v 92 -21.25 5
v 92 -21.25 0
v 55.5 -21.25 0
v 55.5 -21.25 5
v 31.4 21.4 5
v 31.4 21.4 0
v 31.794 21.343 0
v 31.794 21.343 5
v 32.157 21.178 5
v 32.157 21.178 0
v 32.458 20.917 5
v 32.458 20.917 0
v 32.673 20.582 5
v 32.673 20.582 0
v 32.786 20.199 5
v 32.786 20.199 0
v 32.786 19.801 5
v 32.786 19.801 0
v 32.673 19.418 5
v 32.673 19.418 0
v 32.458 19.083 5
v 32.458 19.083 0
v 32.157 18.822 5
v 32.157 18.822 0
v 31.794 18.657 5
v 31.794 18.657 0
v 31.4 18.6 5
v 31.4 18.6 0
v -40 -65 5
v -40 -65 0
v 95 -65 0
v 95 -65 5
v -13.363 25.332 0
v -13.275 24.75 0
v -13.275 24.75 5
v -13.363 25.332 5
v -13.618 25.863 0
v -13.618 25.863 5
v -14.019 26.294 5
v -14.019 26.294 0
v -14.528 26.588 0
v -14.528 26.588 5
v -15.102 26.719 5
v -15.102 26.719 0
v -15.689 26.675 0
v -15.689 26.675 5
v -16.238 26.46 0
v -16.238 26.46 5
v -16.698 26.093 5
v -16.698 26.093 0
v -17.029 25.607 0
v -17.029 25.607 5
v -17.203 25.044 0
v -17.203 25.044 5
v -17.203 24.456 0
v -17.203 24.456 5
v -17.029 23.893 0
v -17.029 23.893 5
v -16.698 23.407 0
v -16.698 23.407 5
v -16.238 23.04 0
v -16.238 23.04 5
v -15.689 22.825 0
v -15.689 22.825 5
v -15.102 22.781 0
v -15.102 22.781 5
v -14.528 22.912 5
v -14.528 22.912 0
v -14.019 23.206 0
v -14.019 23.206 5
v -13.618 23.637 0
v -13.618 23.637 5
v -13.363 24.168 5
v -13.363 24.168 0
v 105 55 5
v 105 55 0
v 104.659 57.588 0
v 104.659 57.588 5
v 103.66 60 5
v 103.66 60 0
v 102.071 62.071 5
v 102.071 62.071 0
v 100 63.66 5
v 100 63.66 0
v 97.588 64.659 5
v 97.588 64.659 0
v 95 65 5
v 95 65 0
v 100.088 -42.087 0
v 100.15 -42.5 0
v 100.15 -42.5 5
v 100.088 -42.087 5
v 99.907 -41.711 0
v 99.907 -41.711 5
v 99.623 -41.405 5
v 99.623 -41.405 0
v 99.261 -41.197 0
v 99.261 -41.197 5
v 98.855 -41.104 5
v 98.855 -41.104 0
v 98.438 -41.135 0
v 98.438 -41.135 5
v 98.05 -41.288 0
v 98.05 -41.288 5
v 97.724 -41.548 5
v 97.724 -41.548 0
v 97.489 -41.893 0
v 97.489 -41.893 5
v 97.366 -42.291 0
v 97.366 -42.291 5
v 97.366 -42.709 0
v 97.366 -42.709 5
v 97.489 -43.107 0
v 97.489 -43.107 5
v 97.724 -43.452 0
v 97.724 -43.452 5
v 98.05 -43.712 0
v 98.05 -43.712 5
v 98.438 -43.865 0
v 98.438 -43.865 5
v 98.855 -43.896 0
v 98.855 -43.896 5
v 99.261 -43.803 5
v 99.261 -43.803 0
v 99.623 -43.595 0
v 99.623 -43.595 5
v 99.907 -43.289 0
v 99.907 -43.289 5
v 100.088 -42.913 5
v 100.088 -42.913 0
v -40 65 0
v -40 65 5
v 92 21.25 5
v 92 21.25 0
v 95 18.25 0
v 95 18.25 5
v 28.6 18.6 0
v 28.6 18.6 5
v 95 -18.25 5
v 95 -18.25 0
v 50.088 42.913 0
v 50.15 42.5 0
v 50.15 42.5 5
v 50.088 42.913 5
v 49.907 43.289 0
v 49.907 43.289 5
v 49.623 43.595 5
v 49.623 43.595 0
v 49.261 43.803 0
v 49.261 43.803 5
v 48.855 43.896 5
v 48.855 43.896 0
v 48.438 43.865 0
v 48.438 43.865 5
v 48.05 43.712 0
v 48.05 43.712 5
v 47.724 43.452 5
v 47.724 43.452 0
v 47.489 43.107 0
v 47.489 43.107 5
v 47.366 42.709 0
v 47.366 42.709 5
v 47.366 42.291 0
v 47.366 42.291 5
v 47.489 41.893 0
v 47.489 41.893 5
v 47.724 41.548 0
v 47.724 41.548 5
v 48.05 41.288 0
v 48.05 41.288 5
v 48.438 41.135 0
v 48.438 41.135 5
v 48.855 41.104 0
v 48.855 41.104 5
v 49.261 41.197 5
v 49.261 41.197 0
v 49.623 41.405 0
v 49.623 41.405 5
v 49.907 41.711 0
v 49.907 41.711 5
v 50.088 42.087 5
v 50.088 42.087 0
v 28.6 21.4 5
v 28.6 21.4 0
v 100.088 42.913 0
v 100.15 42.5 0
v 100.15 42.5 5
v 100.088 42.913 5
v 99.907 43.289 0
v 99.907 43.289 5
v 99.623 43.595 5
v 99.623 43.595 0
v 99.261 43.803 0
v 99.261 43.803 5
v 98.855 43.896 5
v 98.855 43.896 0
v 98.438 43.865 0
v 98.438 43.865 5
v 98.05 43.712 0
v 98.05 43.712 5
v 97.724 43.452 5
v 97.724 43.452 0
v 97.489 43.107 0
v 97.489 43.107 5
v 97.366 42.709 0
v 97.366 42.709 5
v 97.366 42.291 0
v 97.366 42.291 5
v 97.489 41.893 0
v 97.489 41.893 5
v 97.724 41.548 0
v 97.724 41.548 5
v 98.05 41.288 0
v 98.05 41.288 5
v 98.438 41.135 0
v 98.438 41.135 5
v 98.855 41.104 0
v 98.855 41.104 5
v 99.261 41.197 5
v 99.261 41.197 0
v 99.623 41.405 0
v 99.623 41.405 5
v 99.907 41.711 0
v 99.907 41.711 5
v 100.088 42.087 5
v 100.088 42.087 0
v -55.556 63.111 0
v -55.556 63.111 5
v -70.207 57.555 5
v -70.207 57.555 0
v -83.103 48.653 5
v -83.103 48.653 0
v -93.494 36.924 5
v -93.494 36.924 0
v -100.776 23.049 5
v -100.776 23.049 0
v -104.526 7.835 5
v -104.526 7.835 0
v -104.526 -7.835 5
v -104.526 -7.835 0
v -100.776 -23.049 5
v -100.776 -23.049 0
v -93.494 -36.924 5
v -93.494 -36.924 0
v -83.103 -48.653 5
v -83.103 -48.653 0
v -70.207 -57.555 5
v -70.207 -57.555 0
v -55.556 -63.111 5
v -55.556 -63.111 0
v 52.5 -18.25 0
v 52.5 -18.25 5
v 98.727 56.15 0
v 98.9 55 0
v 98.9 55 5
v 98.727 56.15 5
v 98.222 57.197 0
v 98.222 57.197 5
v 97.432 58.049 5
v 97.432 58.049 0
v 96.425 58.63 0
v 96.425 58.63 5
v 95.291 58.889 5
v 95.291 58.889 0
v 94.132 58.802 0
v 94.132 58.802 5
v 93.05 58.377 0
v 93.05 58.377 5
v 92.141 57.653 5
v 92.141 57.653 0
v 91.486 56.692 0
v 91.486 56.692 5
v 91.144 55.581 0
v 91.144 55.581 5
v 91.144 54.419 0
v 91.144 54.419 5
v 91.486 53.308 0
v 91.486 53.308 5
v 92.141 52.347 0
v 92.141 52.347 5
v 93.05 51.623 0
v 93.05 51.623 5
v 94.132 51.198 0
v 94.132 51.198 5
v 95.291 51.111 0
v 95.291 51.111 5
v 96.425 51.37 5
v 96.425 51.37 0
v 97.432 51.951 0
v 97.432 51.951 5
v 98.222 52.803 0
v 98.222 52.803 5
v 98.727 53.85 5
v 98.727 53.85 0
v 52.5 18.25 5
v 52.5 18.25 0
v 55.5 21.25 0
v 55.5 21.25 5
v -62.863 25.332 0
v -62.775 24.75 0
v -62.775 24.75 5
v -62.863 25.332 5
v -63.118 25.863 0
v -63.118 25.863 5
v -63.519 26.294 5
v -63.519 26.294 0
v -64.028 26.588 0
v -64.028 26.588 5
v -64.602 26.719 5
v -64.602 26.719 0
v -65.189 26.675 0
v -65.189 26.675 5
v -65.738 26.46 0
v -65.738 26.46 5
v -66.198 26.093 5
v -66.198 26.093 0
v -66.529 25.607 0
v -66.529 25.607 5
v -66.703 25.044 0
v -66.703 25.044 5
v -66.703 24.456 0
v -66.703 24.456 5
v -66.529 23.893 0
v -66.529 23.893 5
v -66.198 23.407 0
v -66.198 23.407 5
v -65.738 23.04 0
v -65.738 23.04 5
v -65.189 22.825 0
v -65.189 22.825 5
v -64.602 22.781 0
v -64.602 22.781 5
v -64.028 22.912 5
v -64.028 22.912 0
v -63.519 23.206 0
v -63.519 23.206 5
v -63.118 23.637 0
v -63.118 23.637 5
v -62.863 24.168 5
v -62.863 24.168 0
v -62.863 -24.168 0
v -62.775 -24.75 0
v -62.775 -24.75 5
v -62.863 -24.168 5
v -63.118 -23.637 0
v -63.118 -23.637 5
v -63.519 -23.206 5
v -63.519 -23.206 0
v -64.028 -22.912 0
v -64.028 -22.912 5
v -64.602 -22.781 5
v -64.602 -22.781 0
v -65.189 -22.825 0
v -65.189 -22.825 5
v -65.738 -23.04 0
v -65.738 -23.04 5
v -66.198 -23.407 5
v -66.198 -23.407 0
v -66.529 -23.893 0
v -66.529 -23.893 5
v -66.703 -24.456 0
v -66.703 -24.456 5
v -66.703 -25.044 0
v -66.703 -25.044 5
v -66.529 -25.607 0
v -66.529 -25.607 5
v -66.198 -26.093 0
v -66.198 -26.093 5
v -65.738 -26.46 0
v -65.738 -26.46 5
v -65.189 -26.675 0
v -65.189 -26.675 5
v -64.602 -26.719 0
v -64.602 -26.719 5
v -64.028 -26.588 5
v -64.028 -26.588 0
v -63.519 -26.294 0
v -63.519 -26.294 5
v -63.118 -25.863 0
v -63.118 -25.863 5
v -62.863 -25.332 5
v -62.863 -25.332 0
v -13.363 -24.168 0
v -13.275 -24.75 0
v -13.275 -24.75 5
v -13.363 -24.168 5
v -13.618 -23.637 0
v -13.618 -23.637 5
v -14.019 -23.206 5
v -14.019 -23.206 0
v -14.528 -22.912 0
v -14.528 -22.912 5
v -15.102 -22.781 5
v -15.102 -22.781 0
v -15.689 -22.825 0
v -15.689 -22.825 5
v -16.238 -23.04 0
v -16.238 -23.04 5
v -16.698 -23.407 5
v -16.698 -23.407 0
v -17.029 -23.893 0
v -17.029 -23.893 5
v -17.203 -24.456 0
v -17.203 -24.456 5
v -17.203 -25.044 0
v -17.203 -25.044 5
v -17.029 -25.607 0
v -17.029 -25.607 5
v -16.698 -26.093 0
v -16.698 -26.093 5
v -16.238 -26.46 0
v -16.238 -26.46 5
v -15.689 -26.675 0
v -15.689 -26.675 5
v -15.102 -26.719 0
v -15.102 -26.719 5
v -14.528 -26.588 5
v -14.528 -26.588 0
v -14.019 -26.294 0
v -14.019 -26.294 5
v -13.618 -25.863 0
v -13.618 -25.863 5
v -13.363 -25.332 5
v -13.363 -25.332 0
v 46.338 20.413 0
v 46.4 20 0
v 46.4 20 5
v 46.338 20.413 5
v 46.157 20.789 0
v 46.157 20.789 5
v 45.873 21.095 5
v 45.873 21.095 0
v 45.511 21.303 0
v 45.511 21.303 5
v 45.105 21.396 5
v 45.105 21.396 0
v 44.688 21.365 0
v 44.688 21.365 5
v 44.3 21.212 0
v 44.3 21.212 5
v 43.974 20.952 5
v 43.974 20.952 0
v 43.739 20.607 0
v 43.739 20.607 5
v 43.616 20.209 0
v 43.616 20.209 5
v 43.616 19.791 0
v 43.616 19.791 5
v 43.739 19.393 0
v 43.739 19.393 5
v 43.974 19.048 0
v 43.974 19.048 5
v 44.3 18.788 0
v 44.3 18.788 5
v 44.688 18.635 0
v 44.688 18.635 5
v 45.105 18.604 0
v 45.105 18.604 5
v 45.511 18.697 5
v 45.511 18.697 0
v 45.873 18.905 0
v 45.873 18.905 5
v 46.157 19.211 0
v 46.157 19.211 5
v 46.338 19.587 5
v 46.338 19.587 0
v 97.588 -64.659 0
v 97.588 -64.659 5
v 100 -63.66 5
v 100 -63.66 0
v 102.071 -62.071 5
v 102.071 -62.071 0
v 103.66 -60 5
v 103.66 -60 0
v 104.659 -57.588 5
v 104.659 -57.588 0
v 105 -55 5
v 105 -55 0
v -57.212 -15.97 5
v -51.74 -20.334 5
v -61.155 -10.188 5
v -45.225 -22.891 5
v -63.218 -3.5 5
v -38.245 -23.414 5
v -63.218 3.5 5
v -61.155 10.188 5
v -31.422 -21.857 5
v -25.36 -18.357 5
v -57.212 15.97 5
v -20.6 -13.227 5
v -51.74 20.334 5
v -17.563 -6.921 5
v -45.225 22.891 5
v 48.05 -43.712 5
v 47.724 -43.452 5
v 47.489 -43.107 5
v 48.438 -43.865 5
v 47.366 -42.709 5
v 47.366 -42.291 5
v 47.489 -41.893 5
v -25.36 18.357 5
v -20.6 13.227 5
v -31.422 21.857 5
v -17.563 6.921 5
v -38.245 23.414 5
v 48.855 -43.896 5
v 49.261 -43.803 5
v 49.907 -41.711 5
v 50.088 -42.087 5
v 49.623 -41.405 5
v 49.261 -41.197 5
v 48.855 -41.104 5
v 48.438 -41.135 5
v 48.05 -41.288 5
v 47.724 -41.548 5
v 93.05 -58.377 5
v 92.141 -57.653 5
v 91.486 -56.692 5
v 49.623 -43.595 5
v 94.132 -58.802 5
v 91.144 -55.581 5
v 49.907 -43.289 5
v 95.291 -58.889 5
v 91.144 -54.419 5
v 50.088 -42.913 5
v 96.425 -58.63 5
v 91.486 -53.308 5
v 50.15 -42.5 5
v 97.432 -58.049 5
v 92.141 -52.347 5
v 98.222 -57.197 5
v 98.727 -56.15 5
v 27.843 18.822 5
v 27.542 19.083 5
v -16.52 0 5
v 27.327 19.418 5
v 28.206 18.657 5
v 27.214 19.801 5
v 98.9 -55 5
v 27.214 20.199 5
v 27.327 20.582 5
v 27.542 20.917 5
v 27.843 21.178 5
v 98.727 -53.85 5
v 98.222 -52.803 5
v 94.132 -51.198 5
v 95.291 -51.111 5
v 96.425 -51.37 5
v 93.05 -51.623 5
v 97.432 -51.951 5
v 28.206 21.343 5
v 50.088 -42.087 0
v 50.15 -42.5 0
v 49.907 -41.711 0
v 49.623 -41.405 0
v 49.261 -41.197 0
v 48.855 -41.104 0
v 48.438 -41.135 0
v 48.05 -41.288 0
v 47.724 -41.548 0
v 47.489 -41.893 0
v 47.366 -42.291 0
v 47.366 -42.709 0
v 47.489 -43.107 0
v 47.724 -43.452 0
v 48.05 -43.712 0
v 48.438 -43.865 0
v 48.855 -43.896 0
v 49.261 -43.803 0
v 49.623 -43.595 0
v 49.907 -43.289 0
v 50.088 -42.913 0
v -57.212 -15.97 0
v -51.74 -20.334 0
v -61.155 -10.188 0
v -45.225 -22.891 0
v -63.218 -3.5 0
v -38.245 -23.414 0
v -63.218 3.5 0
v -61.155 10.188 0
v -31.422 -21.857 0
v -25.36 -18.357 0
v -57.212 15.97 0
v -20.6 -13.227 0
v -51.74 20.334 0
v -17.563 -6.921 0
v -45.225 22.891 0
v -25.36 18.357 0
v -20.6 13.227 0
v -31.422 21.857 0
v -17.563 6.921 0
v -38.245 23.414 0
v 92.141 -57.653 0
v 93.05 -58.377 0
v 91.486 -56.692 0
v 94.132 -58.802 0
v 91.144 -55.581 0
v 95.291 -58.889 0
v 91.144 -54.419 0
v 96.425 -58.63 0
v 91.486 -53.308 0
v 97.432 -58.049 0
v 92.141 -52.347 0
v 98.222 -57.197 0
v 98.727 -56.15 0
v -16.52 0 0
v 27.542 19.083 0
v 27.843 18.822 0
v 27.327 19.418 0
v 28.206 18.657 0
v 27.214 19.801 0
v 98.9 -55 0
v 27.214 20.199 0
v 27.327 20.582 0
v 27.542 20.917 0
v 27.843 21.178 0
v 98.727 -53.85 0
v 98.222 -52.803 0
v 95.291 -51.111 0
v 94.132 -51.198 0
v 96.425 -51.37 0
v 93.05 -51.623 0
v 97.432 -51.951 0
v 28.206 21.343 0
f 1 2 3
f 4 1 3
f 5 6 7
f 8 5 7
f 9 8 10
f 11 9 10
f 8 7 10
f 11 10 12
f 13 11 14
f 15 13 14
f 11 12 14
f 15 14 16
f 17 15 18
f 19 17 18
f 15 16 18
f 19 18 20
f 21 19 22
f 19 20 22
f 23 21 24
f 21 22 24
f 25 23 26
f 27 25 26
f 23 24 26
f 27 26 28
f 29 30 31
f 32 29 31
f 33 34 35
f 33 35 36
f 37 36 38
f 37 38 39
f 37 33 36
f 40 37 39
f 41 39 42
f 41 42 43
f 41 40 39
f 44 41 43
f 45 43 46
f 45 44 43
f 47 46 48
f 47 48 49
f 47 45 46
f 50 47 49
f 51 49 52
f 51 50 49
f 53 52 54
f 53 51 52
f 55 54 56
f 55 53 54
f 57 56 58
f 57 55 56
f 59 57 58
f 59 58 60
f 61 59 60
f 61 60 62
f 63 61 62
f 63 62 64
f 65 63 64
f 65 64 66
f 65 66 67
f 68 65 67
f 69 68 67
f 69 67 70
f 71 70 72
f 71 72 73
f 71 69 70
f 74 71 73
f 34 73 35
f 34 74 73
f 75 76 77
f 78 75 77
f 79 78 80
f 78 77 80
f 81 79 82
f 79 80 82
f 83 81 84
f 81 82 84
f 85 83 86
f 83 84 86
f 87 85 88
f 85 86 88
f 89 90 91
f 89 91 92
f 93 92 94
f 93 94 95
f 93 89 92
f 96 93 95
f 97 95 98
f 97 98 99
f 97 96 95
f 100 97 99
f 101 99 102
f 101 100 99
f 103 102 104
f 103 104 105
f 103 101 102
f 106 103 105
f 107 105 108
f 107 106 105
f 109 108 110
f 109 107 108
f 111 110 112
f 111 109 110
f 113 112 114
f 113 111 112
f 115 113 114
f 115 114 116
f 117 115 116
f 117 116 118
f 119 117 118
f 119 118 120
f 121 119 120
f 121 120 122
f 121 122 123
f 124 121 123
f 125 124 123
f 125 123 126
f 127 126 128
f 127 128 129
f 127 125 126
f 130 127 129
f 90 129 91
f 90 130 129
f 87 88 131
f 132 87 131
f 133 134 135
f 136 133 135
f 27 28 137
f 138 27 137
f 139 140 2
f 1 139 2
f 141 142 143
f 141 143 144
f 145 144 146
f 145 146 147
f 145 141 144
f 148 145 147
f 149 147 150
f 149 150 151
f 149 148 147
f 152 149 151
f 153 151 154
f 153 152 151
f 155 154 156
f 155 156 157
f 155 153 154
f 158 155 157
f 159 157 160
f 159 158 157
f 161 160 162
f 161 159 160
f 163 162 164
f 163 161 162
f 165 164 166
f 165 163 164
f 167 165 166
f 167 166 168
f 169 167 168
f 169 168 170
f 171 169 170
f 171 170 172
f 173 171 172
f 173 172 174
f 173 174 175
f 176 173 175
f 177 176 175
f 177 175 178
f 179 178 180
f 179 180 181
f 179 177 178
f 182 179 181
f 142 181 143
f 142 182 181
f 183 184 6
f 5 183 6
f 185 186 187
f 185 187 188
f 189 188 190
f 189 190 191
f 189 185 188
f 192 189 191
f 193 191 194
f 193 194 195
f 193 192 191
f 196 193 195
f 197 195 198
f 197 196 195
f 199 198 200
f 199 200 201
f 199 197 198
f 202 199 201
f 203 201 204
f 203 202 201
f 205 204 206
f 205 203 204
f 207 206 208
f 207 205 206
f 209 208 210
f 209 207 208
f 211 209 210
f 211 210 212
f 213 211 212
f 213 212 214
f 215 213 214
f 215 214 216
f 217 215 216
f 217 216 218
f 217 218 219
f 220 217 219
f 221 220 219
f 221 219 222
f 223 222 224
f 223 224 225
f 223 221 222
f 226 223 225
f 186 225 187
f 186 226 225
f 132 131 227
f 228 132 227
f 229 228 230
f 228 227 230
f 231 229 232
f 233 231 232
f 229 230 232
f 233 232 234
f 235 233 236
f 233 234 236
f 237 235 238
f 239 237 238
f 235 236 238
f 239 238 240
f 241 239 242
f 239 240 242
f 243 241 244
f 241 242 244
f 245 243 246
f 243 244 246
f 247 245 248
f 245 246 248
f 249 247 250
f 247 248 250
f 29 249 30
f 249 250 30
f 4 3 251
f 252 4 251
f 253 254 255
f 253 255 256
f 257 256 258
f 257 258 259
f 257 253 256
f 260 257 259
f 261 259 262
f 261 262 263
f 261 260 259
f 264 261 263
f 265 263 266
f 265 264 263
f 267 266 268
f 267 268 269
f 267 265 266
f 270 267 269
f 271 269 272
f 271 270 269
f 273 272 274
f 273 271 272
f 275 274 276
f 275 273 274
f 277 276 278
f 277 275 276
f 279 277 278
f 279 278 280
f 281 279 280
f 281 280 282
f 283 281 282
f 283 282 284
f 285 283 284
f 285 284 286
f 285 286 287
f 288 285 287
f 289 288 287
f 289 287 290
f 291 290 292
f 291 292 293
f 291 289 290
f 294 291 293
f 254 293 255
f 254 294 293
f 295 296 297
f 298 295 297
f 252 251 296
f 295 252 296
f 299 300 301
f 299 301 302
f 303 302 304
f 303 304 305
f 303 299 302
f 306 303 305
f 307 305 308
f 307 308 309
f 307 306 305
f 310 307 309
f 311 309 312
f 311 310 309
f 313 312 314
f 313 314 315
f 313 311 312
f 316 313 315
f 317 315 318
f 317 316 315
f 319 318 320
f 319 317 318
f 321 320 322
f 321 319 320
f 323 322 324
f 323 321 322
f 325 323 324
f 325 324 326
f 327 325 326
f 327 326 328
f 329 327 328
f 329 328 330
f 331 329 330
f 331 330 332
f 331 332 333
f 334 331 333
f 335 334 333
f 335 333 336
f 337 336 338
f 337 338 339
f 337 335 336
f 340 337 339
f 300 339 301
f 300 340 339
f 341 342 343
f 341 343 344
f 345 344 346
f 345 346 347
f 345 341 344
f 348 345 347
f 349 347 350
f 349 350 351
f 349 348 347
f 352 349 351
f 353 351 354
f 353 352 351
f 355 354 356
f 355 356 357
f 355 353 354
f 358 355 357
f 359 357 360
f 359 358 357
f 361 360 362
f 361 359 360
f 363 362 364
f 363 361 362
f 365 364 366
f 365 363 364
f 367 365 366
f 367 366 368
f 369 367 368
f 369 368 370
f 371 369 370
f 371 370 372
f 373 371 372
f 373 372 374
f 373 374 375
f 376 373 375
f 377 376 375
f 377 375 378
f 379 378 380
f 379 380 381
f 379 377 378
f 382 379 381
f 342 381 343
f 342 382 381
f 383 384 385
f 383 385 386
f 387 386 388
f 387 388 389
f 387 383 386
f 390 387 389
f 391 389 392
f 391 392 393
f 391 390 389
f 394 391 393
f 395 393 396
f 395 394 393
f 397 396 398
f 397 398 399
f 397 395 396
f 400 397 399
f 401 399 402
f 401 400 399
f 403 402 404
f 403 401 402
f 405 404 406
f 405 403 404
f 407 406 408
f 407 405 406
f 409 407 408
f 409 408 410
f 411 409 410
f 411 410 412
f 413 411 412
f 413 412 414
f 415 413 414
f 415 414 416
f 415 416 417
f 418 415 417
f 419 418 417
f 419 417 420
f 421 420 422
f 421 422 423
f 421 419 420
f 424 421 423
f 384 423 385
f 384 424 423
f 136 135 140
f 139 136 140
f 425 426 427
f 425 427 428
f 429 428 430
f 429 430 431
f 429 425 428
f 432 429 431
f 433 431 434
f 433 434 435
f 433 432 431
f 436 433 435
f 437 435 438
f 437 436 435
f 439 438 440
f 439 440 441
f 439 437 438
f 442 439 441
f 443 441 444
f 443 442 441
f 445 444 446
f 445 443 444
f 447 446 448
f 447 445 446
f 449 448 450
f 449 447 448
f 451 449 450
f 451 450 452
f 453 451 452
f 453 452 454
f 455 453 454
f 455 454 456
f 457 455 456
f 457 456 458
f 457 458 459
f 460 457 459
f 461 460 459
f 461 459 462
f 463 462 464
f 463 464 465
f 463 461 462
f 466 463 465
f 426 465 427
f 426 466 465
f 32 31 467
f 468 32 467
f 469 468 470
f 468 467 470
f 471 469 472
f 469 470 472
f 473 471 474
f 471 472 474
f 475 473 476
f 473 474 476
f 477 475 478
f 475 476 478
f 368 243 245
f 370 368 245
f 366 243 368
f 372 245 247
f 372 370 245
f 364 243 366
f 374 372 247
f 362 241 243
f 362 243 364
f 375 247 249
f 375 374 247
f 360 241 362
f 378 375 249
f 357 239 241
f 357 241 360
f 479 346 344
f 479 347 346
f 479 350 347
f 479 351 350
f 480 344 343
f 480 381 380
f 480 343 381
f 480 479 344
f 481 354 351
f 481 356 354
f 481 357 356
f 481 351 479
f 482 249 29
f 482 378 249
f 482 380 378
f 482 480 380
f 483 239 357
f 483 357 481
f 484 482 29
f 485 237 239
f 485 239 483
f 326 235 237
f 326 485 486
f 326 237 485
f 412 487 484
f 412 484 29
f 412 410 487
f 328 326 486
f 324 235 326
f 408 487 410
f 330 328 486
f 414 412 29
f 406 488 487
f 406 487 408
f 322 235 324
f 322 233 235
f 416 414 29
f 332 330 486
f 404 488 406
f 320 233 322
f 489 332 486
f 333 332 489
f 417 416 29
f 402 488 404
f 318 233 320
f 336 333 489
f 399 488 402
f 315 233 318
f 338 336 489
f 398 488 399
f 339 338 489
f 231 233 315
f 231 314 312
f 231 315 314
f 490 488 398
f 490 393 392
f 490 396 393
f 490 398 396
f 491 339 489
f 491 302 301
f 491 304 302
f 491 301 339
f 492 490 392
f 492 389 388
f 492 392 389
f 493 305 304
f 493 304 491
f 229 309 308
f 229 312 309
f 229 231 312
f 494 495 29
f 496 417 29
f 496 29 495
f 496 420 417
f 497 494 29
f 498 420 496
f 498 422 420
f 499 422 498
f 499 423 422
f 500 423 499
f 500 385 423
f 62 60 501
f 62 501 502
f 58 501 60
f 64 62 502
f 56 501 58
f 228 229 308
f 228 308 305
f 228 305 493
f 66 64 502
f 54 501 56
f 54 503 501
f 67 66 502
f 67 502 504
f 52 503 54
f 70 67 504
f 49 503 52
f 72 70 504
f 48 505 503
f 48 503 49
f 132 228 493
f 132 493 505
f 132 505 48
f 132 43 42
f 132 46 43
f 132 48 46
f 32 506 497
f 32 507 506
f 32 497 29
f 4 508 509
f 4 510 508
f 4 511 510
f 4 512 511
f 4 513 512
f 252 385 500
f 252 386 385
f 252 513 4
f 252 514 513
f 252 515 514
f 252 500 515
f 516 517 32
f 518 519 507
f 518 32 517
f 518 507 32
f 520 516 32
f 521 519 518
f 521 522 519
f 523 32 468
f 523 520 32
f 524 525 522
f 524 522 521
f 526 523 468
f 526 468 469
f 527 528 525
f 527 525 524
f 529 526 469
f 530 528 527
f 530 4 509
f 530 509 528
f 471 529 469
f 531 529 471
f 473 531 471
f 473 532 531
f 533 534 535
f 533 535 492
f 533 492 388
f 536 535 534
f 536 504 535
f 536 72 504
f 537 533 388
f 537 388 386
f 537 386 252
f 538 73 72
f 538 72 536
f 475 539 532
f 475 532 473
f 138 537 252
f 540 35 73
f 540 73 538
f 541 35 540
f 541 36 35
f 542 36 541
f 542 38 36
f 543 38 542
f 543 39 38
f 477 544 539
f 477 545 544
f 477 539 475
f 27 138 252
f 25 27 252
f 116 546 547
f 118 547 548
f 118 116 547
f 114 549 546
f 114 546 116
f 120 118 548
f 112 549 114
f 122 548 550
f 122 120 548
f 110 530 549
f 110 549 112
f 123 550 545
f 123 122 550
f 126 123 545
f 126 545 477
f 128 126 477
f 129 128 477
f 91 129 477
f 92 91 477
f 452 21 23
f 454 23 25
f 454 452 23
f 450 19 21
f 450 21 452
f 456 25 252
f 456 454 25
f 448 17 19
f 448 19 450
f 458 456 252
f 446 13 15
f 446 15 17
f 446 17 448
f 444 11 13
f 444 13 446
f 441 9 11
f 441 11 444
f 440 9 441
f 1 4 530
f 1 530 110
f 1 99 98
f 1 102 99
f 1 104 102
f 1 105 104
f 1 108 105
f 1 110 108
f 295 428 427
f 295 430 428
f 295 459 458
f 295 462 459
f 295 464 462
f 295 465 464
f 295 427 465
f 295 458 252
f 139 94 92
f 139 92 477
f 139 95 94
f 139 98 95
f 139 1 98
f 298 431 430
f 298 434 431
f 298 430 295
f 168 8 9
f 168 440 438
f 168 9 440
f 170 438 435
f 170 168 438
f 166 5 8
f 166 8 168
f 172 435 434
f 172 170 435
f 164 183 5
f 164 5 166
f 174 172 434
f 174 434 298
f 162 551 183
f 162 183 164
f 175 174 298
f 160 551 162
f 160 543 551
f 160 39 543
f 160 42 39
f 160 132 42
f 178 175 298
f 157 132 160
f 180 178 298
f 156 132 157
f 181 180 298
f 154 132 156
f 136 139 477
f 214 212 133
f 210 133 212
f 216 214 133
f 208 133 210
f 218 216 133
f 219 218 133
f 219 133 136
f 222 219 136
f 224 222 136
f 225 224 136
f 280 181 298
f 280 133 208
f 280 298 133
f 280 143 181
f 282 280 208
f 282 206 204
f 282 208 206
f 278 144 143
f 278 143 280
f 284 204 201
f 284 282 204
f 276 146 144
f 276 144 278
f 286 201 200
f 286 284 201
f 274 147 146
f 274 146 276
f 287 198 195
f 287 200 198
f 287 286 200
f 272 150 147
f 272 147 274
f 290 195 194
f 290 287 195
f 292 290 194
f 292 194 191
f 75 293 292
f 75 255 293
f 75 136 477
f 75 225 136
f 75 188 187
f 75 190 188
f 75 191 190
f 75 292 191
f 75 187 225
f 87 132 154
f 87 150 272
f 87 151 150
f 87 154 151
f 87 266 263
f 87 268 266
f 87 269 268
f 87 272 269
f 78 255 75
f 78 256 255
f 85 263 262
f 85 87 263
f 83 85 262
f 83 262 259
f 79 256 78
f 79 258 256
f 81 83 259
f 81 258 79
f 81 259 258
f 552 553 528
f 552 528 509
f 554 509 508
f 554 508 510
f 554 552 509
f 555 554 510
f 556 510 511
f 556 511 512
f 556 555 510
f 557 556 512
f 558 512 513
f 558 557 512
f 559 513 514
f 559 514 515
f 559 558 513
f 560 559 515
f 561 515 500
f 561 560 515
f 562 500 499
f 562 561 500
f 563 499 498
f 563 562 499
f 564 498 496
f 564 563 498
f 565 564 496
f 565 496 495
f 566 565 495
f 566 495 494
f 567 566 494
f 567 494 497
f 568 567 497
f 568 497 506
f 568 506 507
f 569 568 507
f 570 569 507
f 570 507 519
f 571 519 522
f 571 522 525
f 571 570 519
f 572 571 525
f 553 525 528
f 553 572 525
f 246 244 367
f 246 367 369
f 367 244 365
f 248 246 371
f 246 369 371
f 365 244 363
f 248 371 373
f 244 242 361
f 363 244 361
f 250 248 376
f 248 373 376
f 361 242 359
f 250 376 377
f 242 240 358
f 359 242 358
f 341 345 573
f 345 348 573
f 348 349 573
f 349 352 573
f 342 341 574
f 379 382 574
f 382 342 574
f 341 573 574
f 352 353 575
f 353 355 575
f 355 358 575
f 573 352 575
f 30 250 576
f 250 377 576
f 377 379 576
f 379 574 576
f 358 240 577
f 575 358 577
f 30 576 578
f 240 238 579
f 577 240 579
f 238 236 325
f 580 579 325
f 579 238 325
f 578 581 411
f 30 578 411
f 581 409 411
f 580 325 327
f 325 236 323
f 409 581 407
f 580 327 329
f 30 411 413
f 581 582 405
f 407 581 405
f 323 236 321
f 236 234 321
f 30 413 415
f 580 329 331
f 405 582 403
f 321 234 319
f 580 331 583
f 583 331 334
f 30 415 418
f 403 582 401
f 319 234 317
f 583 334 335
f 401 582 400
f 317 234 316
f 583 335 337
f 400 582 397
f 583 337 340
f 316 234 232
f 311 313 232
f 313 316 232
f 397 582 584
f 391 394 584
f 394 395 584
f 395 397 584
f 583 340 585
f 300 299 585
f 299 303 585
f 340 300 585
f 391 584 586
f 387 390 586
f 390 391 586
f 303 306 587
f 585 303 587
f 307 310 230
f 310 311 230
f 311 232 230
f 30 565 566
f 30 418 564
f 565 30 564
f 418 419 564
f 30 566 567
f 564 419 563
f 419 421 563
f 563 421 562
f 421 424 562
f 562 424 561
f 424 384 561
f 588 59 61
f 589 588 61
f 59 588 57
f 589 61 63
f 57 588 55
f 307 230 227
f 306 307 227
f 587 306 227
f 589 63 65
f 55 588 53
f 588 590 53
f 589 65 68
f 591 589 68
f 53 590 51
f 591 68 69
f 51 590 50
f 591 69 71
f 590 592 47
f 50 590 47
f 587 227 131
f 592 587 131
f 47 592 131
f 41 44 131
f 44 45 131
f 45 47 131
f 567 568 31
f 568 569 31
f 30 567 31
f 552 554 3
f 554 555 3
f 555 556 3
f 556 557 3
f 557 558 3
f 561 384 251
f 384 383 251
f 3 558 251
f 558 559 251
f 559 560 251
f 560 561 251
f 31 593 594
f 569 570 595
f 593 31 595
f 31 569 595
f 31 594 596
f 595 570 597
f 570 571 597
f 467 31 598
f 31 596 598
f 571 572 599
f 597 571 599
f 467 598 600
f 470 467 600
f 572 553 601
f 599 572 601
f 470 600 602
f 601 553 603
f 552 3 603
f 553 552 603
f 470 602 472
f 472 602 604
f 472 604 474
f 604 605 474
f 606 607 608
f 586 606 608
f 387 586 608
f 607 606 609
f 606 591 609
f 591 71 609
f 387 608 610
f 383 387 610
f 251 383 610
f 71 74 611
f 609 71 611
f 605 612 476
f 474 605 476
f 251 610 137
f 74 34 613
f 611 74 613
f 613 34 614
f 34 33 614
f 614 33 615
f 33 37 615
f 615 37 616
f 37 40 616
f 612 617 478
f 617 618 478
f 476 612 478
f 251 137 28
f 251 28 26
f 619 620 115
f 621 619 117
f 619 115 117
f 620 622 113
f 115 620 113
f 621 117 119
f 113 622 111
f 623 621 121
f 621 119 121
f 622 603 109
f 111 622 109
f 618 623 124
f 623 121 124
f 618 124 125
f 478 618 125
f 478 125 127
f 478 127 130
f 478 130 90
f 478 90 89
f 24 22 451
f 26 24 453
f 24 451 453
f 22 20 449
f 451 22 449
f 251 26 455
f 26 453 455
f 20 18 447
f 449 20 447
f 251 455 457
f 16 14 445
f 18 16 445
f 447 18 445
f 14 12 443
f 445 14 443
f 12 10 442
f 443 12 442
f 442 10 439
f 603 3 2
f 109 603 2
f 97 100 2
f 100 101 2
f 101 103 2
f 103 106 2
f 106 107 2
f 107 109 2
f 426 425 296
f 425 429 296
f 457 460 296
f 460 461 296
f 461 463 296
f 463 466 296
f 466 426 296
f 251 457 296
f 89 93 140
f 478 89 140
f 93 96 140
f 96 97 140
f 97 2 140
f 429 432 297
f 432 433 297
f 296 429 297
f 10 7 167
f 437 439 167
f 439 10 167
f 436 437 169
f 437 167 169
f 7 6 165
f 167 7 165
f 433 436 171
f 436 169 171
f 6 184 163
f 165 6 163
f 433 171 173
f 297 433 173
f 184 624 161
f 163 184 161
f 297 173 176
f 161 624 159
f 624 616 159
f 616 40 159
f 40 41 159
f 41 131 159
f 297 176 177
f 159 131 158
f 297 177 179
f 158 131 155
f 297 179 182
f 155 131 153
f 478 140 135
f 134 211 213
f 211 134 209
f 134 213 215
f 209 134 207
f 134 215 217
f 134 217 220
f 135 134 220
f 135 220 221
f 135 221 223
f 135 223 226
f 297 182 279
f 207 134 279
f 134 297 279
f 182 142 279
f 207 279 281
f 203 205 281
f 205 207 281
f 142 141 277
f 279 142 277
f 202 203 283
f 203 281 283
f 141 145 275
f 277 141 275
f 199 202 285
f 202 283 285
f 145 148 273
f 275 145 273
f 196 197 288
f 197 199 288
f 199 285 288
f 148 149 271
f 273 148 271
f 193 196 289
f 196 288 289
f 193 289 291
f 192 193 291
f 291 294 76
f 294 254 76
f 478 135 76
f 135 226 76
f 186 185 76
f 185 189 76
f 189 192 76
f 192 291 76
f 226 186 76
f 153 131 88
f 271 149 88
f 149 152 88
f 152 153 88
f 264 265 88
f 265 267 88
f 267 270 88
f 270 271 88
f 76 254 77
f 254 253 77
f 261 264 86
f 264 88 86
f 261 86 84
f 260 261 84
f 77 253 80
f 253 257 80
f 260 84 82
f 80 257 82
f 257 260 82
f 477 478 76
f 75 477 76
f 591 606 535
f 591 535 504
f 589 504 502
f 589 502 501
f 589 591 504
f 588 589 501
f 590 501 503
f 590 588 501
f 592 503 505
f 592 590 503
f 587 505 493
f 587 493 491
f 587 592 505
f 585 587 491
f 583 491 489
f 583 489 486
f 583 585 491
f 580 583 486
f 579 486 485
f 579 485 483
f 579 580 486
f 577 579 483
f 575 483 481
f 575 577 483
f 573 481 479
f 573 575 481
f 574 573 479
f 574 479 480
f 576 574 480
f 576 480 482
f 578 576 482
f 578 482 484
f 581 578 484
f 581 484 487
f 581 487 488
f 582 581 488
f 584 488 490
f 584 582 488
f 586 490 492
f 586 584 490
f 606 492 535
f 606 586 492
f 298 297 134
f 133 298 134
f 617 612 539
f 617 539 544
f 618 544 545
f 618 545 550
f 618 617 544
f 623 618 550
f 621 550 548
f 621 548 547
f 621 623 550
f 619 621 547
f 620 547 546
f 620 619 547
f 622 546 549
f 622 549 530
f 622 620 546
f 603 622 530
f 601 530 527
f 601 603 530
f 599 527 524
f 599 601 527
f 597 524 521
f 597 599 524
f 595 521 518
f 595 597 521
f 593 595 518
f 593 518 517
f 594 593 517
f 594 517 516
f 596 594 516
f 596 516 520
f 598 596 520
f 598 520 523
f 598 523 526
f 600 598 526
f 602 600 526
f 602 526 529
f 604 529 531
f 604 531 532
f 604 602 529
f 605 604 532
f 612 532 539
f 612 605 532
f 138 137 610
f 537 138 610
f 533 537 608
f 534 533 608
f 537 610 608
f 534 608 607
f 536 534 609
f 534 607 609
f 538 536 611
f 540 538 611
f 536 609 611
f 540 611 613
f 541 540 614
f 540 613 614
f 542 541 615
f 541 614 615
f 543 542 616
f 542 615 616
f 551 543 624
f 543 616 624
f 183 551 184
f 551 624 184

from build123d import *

# Parameters (mm, degrees)
SKETCH1_R           = 3.9
SKETCH1_R_2         = 23.48
SKETCH1_R_3         = 1.975
SKETCH1_R_4         = 1.4
BOSS_EXTRUDE4_DEPTH = 5


with BuildPart() as part:
    # Sketch1 → Boss-Extrude4 (new body)
    with BuildSketch(Plane.XY):
        with BuildLine():
            Line((-40, -65), (95, -65))
            ThreePointArc((95, -65), (102.071067812, -62.071067812), (105, -55))
            Line((105, -55), (105, 55))
            ThreePointArc((105, 55), (102.071067812, 62.071067812), (95, 65))
            Line((95, 65), (-40, 65))
            ThreePointArc((-40, 65), (-105, 0), (-40, -65))
        make_face()
        with Locations((95, 55)):
            Circle(SKETCH1_R, mode=Mode.SUBTRACT)
        with Locations((95, -55)):
            Circle(SKETCH1_R, mode=Mode.SUBTRACT)
        with Locations((-40, 0)):
            Circle(SKETCH1_R_2, mode=Mode.SUBTRACT)
        with Locations((-64.75, 24.75)):
            Circle(SKETCH1_R_3, mode=Mode.SUBTRACT)
        with Locations((-15.25, 24.75)):
            Circle(SKETCH1_R_3, mode=Mode.SUBTRACT)
        with Locations((-15.25, -24.75)):
            Circle(SKETCH1_R_3, mode=Mode.SUBTRACT)
        with Locations((-64.75, -24.75)):
            Circle(SKETCH1_R_3, mode=Mode.SUBTRACT)
        with Locations((98.75, 42.5)):
            Circle(SKETCH1_R_4, mode=Mode.SUBTRACT)
        with Locations((48.75, 42.5)):
            Circle(SKETCH1_R_4, mode=Mode.SUBTRACT)
        with Locations((48.75, -42.5)):
            Circle(SKETCH1_R_4, mode=Mode.SUBTRACT)
        with Locations((98.75, -42.5)):
            Circle(SKETCH1_R_4, mode=Mode.SUBTRACT)
        with Locations((45, 20)):
            Circle(SKETCH1_R_4, mode=Mode.SUBTRACT)
        Polygon((95, 18.25), (95, -18.25), (92, -21.25), (55.5, -21.25), (52.5, -18.25), (52.5, 18.25), (55.5, 21.25), (92, 21.25), align=None, mode=Mode.SUBTRACT)
        with BuildLine():
            Line((28.6, 21.4), (31.4, 21.4))
            ThreePointArc((31.4, 21.4), (32.8, 20), (31.4, 18.6))
            Line((31.4, 18.6), (28.6, 18.6))
            ThreePointArc((28.6, 18.6), (27.2, 20), (28.6, 21.4))
        make_face(mode=Mode.SUBTRACT)
    extrude(amount=BOSS_EXTRUDE4_DEPTH)


solid = part.part
